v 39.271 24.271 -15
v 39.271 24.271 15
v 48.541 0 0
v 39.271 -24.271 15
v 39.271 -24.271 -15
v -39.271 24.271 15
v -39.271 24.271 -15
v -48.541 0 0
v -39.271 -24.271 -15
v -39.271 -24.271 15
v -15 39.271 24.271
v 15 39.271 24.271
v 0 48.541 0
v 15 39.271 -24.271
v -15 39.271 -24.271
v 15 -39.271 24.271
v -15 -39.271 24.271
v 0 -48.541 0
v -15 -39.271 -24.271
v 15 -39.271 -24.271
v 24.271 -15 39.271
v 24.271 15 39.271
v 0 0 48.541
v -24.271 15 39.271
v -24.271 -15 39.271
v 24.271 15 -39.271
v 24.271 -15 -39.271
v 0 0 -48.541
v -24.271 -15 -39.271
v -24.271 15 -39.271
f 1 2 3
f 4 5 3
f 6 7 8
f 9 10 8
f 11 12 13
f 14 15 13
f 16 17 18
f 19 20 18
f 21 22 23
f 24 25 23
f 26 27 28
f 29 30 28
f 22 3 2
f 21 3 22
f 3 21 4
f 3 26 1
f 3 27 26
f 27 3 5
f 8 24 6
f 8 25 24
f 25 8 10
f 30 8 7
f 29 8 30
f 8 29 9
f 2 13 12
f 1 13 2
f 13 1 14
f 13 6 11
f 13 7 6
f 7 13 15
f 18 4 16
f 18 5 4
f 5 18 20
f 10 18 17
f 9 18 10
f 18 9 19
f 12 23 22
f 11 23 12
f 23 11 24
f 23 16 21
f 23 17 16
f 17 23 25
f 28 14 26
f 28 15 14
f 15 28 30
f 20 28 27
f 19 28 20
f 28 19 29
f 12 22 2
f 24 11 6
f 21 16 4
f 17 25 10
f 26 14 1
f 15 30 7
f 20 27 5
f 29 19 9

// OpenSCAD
// Icosidodecahedron
// (C) @oblomobka - 2023.06
// GPL license

/* **CUSTOMIZER VARIABLES** */
// Edge
edge = 30; // [10:100]
// Center of the solid or stand over a face
position = "Center"; // ["Center", "Face"]

/* **MODULES** */   
module Icosidodecahedron( edge = 30, position = "Face"){ //aD -> Conway notation 
    // Constants
    phi = (1+sqrt(5))/2; // Golden ratio = 1,618...
    
    // Invariants
    angle_aD = asin(2*sqrt((5+sqrt(5))/10)/(1+sqrt(5))); // angle vertex to center pentagon
    hPentagon = sqrt(phi^2-((5+sqrt(5))/10));
    
    // Variables
    r = edge*phi;
    a = edge*(phi^2)/2;
    b = edge*phi/2;
    c = edge/2;
    
    // Definition of points and faces V = 30 / F = 32 ( 20 triangles + 12 pentagons )
    // (0, 0, ±φ) and even permutations of ( ±φ^2/2, ±φ/2, ±1/2 )
    aDpoints = [
        [ +r,  0,  0], [  0, +r,  0], [  0,  0, +r], [ -r,  0,  0], [  0, -r,  0], [  0,  0, -r],  // [  0 -  5]
        
        // Rectangle XYZ
        [ +a, +b, +c], [ -a, +b, +c], [ +a, -b, +c], [ -a, -b, +c],     // UP       [  6 -  9]
        [ +a, +b, -c], [ -a, +b, -c], [ +a, -b, -c], [ -a, -b, -c],     // Down     [ 10 - 13]
        
        // Rectangle XZY
        [ +b, +c, +a], [ -b, +c, +a], [ +b, -c, +a], [ -b, -c, +a],     // UP       [ 14 - 17]
        [ +b, +c, -a], [ -b, +c, -a], [ +b, -c, -a], [ -b, -c, -a],     // Down     [ 18 - 21]
        
        // Rectangle YZX
        [ +c, +a, +b], [ -c, +a, +b], [ +c, -a, +b], [ -c, -a, +b],     // UP       [ 22 - 25]
        [ +c, +a, -b], [ -c, +a, -b], [ +c, -a, -b], [ -c, -a, -b]      // DOWN     [ 26 - 29]
        ];
    
    aDfaces = [
        [  0,  6, 10], [  0, 12,  8], [  3, 11,  7], [  3,  9, 13],     // triangles touching X axis
        [  1, 22, 23], [  1, 27, 26], [  4, 25, 24], [  4, 28, 29],     // triangles touching Y axis
        [  2, 14, 16], [  2, 17, 15], [  5, 20, 18], [  5, 19, 21],     // triangles touching Z axis
        
        [  0,  8, 16, 14,  6], [  0, 10, 18, 20, 12], [  3,  7, 15, 17,  9], [  3, 13, 21, 19, 11],  // pentagons touching X axis
        [  1, 26, 10,  6, 22], [  1, 23,  7, 11, 27], [  4, 24,  8, 12, 28], [  4, 29, 13,  9, 25],  // pentagons touching X axis
        [  2, 15, 23, 22, 14], [  2, 16, 24, 25, 17], [  5, 18, 26, 27, 19], [  5, 21, 29, 28, 20],  // pentagons touching Z axis
        
        [  6, 14, 22], [  7, 23, 15], [  8, 24, 16], [  9, 17, 25],     // triangles in octants UP
        [ 10, 26, 18], [ 11, 19, 27], [ 12, 20, 28], [ 13, 29, 21]      // triangles in octants DOWN
        ];
  
    // Polyhedron stands on xy plane centered on the center of the face or centered on the center of polyhedron
    if ( position == "Center") {
        polyhedron ( aDpoints, aDfaces);
        }
        
    else if ( position == "Face") {
        translate ([ 0, 0, (hPentagon*edge)])
            rotate ([ 0, 90-angle_aD, 0])
                polyhedron ( aDpoints, aDfaces);}
    }
    
/* **RENDERING OF SOLIDS** */
Icosidodecahedron ( edge = edge, position = position);
